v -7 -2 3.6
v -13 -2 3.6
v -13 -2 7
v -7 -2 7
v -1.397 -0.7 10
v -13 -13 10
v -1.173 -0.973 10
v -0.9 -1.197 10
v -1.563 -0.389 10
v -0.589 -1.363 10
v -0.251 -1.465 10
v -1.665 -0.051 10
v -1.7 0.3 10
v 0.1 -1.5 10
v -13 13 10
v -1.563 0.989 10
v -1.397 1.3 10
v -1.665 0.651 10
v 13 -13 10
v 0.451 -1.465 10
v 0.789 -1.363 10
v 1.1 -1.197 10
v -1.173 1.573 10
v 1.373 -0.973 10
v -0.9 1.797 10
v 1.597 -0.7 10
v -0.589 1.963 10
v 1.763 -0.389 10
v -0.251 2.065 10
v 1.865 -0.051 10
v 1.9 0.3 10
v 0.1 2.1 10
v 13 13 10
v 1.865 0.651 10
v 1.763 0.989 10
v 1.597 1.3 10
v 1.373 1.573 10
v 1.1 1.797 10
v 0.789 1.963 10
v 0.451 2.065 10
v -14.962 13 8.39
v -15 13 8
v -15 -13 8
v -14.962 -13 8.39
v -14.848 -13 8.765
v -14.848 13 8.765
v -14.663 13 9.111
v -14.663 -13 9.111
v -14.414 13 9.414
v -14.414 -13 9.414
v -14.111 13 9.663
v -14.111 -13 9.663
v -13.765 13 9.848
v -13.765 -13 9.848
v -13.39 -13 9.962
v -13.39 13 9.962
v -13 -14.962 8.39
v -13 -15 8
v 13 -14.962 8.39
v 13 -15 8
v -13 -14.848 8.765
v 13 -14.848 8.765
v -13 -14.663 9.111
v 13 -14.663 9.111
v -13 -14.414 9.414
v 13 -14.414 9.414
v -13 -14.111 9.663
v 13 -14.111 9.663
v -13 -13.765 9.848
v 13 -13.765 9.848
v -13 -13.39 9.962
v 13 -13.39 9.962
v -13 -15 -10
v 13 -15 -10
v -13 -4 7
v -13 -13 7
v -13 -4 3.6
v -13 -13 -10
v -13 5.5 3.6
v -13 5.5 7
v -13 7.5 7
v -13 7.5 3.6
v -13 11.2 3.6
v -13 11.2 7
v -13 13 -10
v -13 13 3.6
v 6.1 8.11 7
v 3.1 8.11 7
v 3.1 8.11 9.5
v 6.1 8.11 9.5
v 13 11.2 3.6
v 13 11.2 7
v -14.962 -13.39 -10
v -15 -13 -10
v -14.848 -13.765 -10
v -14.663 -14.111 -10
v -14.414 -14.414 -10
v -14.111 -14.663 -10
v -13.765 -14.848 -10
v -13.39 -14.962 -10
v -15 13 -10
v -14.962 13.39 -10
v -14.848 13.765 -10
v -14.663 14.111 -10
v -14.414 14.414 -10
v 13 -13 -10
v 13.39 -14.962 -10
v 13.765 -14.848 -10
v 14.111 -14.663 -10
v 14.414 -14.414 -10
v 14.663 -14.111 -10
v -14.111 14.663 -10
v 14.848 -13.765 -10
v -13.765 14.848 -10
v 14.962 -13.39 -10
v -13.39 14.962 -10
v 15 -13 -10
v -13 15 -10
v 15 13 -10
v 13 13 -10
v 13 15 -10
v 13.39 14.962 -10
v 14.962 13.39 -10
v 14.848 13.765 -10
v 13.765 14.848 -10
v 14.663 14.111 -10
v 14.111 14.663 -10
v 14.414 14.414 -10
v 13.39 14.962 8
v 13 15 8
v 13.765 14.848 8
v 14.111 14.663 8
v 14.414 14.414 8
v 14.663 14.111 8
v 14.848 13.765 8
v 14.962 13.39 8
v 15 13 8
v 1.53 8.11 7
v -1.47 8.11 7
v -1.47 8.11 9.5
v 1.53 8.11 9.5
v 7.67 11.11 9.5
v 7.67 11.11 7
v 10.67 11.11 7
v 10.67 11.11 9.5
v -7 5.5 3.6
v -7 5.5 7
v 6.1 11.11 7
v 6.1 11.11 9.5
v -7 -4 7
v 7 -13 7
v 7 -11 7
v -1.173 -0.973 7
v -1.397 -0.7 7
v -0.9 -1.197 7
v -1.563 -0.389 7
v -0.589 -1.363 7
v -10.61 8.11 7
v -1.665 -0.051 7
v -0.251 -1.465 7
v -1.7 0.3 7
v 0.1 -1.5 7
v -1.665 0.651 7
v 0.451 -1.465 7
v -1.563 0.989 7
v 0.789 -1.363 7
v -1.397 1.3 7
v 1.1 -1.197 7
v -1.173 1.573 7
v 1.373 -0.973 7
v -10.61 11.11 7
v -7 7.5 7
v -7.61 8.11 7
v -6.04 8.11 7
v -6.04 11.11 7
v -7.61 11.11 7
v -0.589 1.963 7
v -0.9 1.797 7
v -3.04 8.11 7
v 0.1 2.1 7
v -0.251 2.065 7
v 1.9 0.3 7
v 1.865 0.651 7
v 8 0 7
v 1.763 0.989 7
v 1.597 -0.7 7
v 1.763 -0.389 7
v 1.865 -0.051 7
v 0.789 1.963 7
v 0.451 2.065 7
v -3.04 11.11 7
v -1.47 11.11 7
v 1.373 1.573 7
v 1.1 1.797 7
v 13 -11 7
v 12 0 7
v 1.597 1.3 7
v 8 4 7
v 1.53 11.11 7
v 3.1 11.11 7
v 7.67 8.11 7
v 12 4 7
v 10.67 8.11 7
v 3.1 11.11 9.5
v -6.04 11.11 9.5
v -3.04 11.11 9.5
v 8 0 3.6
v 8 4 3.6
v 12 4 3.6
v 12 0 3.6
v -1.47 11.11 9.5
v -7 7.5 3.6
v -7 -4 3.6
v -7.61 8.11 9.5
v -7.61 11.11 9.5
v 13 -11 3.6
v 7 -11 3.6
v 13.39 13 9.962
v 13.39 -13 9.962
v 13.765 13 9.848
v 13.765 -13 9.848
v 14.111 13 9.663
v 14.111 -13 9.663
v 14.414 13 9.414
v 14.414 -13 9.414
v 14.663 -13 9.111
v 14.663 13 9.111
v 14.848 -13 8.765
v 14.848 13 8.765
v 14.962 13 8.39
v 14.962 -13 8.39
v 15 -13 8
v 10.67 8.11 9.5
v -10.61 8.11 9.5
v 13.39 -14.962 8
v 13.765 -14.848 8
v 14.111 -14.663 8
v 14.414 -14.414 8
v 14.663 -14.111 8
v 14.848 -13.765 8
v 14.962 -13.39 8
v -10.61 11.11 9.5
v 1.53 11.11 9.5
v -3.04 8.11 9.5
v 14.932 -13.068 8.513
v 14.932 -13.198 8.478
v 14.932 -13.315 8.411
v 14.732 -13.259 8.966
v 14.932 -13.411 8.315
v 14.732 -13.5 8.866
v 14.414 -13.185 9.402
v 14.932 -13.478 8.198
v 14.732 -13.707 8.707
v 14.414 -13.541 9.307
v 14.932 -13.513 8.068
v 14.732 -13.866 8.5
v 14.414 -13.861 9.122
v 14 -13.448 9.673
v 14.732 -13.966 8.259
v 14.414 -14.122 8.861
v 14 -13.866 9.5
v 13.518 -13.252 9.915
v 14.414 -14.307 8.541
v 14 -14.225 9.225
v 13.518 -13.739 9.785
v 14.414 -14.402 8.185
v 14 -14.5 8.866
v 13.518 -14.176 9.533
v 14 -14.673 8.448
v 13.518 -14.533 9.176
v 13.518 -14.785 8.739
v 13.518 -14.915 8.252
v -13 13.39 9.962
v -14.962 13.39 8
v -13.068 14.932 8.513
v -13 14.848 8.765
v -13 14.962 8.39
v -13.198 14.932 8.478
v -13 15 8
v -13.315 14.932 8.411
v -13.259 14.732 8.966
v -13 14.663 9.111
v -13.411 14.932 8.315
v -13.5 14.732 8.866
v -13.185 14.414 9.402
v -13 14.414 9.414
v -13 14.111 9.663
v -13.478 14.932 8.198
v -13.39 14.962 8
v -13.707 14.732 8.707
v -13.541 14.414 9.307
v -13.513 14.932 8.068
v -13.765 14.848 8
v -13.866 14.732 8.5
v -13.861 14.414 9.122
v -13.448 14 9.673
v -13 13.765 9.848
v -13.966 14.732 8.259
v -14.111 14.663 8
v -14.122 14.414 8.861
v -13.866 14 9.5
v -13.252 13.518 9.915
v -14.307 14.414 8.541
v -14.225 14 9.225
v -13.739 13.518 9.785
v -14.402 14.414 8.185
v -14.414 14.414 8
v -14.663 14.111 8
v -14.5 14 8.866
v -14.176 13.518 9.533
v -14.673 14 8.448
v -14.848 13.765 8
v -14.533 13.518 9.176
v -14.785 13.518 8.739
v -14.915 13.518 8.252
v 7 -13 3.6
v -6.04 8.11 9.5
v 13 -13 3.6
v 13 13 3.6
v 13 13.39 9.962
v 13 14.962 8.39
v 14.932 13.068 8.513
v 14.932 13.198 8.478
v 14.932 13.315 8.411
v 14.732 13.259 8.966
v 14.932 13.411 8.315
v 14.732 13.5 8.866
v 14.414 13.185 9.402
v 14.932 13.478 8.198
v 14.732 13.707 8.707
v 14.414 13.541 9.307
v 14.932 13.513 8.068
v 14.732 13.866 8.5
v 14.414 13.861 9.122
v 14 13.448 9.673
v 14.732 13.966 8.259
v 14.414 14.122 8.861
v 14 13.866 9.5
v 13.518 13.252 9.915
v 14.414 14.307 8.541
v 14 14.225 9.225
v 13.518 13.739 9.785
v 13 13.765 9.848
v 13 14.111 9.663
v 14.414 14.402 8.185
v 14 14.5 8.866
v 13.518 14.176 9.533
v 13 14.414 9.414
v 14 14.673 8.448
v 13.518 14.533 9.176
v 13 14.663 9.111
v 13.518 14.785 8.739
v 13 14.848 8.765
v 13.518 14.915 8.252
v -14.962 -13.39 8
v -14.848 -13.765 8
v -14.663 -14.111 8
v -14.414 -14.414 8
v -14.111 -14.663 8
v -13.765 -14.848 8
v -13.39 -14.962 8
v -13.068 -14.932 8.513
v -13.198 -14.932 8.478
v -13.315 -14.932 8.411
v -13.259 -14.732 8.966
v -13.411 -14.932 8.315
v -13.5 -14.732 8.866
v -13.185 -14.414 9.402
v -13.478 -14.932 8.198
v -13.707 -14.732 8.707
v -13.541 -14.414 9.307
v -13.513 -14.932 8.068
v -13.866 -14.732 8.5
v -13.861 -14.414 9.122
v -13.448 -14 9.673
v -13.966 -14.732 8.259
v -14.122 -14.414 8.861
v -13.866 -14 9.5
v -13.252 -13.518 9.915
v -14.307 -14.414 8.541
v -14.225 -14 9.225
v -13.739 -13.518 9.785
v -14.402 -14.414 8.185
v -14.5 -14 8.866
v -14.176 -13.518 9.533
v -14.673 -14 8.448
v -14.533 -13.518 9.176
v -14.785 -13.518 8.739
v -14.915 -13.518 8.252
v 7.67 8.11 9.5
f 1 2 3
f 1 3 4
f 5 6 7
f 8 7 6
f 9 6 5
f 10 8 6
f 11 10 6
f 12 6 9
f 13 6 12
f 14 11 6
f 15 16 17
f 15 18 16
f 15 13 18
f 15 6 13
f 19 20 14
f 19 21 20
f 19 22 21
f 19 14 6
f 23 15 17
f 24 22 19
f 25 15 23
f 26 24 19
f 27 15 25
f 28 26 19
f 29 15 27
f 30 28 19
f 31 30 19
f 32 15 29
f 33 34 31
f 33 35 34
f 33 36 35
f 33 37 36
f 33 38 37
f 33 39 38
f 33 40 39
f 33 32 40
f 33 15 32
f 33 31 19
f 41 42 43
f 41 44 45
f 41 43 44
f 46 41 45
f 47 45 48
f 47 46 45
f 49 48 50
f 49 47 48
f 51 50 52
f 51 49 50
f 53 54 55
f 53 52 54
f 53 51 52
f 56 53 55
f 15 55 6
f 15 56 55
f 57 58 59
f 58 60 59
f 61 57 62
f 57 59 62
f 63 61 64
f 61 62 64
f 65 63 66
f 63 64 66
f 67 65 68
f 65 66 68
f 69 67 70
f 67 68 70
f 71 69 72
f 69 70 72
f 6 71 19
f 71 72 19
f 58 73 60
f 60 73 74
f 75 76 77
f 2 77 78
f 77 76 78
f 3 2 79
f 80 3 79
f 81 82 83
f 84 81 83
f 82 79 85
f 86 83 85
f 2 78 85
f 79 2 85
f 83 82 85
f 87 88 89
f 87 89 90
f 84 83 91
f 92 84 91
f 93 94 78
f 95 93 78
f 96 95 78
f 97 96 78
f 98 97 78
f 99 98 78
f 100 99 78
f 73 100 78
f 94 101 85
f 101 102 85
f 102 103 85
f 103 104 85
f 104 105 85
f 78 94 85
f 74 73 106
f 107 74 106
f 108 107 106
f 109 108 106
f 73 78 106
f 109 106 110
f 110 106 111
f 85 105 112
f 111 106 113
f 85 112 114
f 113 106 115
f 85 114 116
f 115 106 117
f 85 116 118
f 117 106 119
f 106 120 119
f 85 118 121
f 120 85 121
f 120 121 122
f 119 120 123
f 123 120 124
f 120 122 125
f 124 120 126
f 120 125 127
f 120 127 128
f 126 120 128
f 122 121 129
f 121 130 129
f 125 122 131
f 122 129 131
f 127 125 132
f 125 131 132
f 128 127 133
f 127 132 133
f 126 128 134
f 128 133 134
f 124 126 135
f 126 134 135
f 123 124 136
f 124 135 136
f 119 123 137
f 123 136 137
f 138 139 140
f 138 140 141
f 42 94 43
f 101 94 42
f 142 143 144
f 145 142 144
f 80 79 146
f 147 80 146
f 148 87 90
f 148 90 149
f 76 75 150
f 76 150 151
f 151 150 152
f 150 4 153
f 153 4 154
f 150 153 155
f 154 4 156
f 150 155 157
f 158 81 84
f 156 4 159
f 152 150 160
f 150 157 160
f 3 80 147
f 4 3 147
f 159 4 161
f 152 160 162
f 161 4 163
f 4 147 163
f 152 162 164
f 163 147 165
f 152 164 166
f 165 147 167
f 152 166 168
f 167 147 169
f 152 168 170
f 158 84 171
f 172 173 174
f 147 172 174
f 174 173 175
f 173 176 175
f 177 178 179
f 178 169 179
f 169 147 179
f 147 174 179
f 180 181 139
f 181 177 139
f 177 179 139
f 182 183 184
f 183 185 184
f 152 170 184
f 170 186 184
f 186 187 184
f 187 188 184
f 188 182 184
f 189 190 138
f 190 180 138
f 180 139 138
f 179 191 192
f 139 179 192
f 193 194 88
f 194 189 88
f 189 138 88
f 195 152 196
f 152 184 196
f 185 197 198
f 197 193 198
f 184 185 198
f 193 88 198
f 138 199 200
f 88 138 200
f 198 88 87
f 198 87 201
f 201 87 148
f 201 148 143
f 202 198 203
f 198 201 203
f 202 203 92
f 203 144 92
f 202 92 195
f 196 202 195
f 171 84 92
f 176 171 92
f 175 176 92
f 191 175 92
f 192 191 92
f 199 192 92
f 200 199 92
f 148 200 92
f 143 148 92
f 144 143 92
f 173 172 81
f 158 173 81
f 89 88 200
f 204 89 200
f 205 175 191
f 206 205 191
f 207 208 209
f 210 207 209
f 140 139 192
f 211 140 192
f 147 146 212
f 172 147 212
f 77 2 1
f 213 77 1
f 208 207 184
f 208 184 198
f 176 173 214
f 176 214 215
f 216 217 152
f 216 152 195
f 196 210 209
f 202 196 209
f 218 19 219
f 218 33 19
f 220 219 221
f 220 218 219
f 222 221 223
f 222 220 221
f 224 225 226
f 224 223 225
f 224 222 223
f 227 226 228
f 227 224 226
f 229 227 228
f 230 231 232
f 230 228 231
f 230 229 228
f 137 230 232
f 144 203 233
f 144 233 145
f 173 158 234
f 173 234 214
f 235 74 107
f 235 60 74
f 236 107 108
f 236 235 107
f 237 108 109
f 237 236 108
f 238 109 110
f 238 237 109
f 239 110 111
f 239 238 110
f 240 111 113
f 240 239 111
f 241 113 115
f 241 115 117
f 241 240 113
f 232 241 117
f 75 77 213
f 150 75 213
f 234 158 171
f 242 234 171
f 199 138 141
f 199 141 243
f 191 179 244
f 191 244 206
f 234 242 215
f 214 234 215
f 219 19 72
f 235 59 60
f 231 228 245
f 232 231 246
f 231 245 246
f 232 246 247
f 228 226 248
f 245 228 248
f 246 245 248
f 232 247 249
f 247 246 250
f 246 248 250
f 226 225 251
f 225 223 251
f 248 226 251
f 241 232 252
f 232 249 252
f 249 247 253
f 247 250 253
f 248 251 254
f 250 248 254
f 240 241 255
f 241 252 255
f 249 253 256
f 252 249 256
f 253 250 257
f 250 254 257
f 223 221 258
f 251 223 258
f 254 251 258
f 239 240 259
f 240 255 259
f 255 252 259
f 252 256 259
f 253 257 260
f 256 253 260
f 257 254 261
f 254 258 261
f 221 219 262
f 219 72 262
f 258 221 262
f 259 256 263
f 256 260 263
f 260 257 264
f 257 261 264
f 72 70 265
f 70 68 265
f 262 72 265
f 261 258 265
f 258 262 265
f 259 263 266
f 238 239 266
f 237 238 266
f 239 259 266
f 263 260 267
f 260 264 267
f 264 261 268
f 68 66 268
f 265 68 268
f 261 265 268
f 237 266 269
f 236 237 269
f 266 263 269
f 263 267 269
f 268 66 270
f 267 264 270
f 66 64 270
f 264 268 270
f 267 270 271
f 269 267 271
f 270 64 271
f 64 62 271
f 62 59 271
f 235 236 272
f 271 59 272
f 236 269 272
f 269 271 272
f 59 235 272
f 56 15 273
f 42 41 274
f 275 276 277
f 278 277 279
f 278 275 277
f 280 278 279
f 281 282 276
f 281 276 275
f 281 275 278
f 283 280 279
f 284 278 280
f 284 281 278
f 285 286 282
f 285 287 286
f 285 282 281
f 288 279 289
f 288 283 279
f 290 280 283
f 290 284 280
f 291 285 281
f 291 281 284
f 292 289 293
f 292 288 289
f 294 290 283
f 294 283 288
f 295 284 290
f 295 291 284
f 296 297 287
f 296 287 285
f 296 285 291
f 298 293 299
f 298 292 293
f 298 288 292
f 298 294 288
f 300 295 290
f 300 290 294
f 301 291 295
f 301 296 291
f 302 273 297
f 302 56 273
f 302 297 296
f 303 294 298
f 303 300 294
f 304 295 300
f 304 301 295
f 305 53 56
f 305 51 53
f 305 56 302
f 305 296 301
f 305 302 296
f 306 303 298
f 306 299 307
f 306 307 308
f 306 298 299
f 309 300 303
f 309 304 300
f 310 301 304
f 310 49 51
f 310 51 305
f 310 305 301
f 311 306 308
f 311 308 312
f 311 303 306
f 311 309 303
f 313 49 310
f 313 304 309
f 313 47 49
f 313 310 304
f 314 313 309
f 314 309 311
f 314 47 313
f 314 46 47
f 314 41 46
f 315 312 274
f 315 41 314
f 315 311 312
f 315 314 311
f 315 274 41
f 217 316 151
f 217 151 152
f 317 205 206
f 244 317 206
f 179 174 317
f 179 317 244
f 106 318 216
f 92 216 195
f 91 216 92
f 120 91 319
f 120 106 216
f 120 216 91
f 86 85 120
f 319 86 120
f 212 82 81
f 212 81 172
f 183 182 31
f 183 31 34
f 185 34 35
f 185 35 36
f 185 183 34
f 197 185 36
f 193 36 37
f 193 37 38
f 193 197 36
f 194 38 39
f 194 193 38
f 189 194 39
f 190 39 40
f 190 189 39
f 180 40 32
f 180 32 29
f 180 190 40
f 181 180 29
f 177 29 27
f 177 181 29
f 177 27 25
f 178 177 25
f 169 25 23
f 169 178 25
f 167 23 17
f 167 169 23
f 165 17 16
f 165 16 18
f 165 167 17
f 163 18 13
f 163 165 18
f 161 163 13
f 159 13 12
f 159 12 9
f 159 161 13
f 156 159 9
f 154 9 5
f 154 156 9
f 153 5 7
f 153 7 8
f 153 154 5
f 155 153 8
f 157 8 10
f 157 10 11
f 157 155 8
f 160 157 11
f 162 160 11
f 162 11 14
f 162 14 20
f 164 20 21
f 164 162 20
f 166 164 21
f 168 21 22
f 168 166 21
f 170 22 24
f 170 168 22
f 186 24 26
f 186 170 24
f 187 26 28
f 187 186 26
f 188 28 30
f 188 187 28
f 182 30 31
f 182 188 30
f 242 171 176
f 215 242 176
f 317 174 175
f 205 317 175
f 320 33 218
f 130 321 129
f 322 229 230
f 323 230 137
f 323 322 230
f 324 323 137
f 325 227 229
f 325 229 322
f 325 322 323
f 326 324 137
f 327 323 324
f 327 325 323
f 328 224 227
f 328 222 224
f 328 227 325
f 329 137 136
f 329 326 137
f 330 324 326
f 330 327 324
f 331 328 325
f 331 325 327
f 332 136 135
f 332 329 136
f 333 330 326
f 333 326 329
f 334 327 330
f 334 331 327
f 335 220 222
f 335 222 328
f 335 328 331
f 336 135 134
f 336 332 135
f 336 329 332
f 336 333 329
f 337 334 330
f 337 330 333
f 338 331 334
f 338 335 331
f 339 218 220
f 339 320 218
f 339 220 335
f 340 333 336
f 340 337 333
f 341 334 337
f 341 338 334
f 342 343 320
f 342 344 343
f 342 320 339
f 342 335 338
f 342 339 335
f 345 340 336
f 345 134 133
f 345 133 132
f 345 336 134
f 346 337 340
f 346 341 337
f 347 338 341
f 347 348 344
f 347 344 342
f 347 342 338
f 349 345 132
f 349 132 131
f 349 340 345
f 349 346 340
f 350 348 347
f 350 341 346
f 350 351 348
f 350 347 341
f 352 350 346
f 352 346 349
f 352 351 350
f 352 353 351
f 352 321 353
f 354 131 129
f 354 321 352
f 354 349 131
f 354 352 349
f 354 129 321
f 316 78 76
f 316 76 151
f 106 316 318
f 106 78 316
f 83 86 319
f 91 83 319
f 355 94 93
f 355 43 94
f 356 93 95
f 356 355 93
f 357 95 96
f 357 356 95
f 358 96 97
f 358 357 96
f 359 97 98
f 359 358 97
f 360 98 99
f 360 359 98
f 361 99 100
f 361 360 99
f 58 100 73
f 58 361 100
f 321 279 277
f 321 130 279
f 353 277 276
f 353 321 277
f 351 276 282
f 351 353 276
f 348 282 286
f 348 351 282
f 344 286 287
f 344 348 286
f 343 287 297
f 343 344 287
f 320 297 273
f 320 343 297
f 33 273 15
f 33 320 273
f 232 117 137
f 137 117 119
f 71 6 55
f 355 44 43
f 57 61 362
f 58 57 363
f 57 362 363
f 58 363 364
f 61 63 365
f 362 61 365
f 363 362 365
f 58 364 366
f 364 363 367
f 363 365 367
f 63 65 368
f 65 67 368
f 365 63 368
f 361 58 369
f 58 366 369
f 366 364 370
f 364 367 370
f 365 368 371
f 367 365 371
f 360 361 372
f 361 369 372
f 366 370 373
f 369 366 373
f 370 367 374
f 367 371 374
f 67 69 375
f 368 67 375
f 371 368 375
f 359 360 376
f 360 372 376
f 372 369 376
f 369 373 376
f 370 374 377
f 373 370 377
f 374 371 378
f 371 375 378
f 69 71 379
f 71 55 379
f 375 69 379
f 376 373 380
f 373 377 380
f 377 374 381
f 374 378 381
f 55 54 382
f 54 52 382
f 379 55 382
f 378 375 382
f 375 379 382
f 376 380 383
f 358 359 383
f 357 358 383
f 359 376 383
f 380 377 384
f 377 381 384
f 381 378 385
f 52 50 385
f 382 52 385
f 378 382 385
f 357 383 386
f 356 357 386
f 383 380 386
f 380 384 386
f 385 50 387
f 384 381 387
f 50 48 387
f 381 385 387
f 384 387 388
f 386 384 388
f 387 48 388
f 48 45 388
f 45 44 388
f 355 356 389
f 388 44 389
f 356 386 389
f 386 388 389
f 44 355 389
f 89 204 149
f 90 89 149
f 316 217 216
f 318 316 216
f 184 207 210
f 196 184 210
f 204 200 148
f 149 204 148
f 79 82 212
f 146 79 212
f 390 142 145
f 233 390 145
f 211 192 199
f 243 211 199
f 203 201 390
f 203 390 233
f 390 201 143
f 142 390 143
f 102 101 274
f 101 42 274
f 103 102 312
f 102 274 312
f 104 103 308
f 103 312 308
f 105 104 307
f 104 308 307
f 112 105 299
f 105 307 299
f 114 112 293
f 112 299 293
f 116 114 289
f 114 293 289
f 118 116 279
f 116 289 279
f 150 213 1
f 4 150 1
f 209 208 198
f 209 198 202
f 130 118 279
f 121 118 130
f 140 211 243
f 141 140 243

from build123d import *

# Parameters (mm, degrees)
CYLINDER001_R     = 1.8
CYLINDER001_DEPTH = 3
BOX006_W          = 3
BOX006_H          = 3
BOX006_DEPTH      = 3
BOX005_W          = 3
BOX005_H          = 3
BOX005_DEPTH      = 3
BOX003_W          = 3
BOX003_H          = 3
BOX003_DEPTH      = 3
BOX004_W          = 3
BOX004_H          = 3
BOX004_DEPTH      = 3
BOX002_W          = 3
BOX002_H          = 3
BOX002_DEPTH      = 3
BOX_W             = 26
BOX_H             = 26
BOX_DEPTH         = 17
BOX001_W          = 30
BOX001_H          = 30
BOX001_DEPTH      = 20
BOX010_W          = 6
BOX010_H          = 2
BOX010_DEPTH      = 3.4
BOX008_W          = 4
BOX008_H          = 4
BOX008_DEPTH      = 3.4
BOX007_W          = 26
BOX007_H          = 1.8
BOX007_DEPTH      = 3.4
BOX009_W          = 6
BOX009_H          = 2
BOX009_DEPTH      = 3.4
BOX011_W          = 6
BOX011_H          = 2
BOX011_DEPTH      = 3.4
FILLET_R          = 2


with BuildPart() as buttouch:
    # Cylinder001 → Cylinder001 (new body)
    with BuildSketch(Plane(origin=(0.1, 0.3, 7), x_dir=(1, 0, 0), z_dir=(0, 0, 1))):
        Circle(CYLINDER001_R)
    extrude(amount=CYLINDER001_DEPTH)


with BuildPart() as l5:
    # Box006 → Box006 (new body)
    with BuildSketch(Plane(origin=(7.67, 8.11, 6.5), x_dir=(1, 0, 0), z_dir=(0, 0, 1))):
        with Locations((1.5, 1.5)):
            Rectangle(BOX006_W, BOX006_H)
    extrude(amount=BOX006_DEPTH)


with BuildPart() as l4:
    # Box005 → Box005 (new body)
    with BuildSketch(Plane(origin=(3.1, 8.11, 6.5), x_dir=(1, 0, 0), z_dir=(0, 0, 1))):
        with Locations((1.5, 1.5)):
            Rectangle(BOX005_W, BOX005_H)
    extrude(amount=BOX005_DEPTH)


with BuildPart() as l2:
    # Box003 → Box003 (new body)
    with BuildSketch(Plane(origin=(-6.04, 8.11, 6.5), x_dir=(1, 0, 0), z_dir=(0, 0, 1))):
        with Locations((1.5, 1.5)):
            Rectangle(BOX003_W, BOX003_H)
    extrude(amount=BOX003_DEPTH)


with BuildPart() as l3:
    # Box004 → Box004 (new body)
    with BuildSketch(Plane(origin=(-1.47, 8.11, 6.5), x_dir=(1, 0, 0), z_dir=(0, 0, 1))):
        with Locations((1.5, 1.5)):
            Rectangle(BOX004_W, BOX004_H)
    extrude(amount=BOX004_DEPTH)


with BuildPart() as fusion:
    # Box002 → Box002 (new body)
    with BuildSketch(Plane(origin=(-10.61, 8.11, 6.5), x_dir=(1, 0, 0), z_dir=(0, 0, 1))):
        with Locations((1.5, 1.5)):
            Rectangle(BOX002_W, BOX002_H)
    extrude(amount=BOX002_DEPTH)

    # Fusion: union L5, L4, L2, L3
    add(l5.part)
    add(l4.part)
    add(l2.part)
    add(l3.part)


with BuildPart() as maininside:
    # Box → Box (new body)
    with BuildSketch(Plane(origin=(-13, -13, -10), x_dir=(1, 0, 0), z_dir=(0, 0, 1))):
        with Locations((13, 13)):
            Rectangle(BOX_W, BOX_H)
    extrude(amount=BOX_DEPTH)


with BuildPart() as cut002:
    # Box001 → Box001 (new body)
    with BuildSketch(Plane(origin=(-15, -15, -10), x_dir=(1, 0, 0), z_dir=(0, 0, 1))):
        with Locations((15, 15)):
            Rectangle(BOX001_W, BOX001_H)
    extrude(amount=BOX001_DEPTH)

    # Cut: cut MainInside
    add(maininside.part, mode=Mode.SUBTRACT)

    # Cut001: cut Fusion
    add(fusion.part, mode=Mode.SUBTRACT)

    # Cut002: cut ButTouch
    add(buttouch.part, mode=Mode.SUBTRACT)


with BuildPart() as cubedestek4:
    # Box010 → Box010 (new body)
    with BuildSketch(Plane(origin=(-13, 5.5, 3.6), x_dir=(1, 0, 0), z_dir=(0, 0, 1))):
        with Locations((3, 1)):
            Rectangle(BOX010_W, BOX010_H)
    extrude(amount=BOX010_DEPTH)


with BuildPart() as cubedestek2:
    # Box008 → Box008 (new body)
    with BuildSketch(Plane(origin=(8, 0, 3.6), x_dir=(1, 0, 0), z_dir=(0, 0, 1))):
        with Locations((2, 2)):
            Rectangle(BOX008_W, BOX008_H)
    extrude(amount=BOX008_DEPTH)


with BuildPart() as cubedestek:
    # Box007 → Box007 (new body)
    with BuildSketch(Plane(origin=(-13, 11.2, 3.6), x_dir=(1, 0, 0), z_dir=(0, 0, 1))):
        with Locations((13, 0.9)):
            Rectangle(BOX007_W, BOX007_H)
    extrude(amount=BOX007_DEPTH)


with BuildPart() as cubedestek3:
    # Box009 → Box009 (new body)
    with BuildSketch(Plane(origin=(-13, -4, 3.6), x_dir=(1, 0, 0), z_dir=(0, 0, 1))):
        with Locations((3, 1)):
            Rectangle(BOX009_W, BOX009_H)
    extrude(amount=BOX009_DEPTH)


with BuildPart() as fillet_body:
    # Box011 → Box011 (new body)
    with BuildSketch(Plane(origin=(7, -13, 3.6), x_dir=(1, 0, 0), z_dir=(0, 0, 1))):
        with Locations((3, 1)):
            Rectangle(BOX011_W, BOX011_H)
    extrude(amount=BOX011_DEPTH)

    # Fusion002: union CubeDestek4, CubeDestek2, CubeDestek, CubeDestek3
    add(cubedestek4.part)
    add(cubedestek2.part)
    add(cubedestek.part)
    add(cubedestek3.part)

    # Fusion005: union Cut002
    add(cut002.part)

    # Fillet
    fillet_edges = [fillet_body.edges().sort_by_distance(p)[0] for p in [
        (-15, 0, 10),
        (0, 15, 10),
        (0, -15, 10),
        (15, 0, 10),
        (-15, -15, 0),
        (-15, 15, 0),
        (15, 15, 0),
        (15, -15, 0),
    ]]
    fillet(fillet_edges, radius=FILLET_R)


solid = fillet_body.part
